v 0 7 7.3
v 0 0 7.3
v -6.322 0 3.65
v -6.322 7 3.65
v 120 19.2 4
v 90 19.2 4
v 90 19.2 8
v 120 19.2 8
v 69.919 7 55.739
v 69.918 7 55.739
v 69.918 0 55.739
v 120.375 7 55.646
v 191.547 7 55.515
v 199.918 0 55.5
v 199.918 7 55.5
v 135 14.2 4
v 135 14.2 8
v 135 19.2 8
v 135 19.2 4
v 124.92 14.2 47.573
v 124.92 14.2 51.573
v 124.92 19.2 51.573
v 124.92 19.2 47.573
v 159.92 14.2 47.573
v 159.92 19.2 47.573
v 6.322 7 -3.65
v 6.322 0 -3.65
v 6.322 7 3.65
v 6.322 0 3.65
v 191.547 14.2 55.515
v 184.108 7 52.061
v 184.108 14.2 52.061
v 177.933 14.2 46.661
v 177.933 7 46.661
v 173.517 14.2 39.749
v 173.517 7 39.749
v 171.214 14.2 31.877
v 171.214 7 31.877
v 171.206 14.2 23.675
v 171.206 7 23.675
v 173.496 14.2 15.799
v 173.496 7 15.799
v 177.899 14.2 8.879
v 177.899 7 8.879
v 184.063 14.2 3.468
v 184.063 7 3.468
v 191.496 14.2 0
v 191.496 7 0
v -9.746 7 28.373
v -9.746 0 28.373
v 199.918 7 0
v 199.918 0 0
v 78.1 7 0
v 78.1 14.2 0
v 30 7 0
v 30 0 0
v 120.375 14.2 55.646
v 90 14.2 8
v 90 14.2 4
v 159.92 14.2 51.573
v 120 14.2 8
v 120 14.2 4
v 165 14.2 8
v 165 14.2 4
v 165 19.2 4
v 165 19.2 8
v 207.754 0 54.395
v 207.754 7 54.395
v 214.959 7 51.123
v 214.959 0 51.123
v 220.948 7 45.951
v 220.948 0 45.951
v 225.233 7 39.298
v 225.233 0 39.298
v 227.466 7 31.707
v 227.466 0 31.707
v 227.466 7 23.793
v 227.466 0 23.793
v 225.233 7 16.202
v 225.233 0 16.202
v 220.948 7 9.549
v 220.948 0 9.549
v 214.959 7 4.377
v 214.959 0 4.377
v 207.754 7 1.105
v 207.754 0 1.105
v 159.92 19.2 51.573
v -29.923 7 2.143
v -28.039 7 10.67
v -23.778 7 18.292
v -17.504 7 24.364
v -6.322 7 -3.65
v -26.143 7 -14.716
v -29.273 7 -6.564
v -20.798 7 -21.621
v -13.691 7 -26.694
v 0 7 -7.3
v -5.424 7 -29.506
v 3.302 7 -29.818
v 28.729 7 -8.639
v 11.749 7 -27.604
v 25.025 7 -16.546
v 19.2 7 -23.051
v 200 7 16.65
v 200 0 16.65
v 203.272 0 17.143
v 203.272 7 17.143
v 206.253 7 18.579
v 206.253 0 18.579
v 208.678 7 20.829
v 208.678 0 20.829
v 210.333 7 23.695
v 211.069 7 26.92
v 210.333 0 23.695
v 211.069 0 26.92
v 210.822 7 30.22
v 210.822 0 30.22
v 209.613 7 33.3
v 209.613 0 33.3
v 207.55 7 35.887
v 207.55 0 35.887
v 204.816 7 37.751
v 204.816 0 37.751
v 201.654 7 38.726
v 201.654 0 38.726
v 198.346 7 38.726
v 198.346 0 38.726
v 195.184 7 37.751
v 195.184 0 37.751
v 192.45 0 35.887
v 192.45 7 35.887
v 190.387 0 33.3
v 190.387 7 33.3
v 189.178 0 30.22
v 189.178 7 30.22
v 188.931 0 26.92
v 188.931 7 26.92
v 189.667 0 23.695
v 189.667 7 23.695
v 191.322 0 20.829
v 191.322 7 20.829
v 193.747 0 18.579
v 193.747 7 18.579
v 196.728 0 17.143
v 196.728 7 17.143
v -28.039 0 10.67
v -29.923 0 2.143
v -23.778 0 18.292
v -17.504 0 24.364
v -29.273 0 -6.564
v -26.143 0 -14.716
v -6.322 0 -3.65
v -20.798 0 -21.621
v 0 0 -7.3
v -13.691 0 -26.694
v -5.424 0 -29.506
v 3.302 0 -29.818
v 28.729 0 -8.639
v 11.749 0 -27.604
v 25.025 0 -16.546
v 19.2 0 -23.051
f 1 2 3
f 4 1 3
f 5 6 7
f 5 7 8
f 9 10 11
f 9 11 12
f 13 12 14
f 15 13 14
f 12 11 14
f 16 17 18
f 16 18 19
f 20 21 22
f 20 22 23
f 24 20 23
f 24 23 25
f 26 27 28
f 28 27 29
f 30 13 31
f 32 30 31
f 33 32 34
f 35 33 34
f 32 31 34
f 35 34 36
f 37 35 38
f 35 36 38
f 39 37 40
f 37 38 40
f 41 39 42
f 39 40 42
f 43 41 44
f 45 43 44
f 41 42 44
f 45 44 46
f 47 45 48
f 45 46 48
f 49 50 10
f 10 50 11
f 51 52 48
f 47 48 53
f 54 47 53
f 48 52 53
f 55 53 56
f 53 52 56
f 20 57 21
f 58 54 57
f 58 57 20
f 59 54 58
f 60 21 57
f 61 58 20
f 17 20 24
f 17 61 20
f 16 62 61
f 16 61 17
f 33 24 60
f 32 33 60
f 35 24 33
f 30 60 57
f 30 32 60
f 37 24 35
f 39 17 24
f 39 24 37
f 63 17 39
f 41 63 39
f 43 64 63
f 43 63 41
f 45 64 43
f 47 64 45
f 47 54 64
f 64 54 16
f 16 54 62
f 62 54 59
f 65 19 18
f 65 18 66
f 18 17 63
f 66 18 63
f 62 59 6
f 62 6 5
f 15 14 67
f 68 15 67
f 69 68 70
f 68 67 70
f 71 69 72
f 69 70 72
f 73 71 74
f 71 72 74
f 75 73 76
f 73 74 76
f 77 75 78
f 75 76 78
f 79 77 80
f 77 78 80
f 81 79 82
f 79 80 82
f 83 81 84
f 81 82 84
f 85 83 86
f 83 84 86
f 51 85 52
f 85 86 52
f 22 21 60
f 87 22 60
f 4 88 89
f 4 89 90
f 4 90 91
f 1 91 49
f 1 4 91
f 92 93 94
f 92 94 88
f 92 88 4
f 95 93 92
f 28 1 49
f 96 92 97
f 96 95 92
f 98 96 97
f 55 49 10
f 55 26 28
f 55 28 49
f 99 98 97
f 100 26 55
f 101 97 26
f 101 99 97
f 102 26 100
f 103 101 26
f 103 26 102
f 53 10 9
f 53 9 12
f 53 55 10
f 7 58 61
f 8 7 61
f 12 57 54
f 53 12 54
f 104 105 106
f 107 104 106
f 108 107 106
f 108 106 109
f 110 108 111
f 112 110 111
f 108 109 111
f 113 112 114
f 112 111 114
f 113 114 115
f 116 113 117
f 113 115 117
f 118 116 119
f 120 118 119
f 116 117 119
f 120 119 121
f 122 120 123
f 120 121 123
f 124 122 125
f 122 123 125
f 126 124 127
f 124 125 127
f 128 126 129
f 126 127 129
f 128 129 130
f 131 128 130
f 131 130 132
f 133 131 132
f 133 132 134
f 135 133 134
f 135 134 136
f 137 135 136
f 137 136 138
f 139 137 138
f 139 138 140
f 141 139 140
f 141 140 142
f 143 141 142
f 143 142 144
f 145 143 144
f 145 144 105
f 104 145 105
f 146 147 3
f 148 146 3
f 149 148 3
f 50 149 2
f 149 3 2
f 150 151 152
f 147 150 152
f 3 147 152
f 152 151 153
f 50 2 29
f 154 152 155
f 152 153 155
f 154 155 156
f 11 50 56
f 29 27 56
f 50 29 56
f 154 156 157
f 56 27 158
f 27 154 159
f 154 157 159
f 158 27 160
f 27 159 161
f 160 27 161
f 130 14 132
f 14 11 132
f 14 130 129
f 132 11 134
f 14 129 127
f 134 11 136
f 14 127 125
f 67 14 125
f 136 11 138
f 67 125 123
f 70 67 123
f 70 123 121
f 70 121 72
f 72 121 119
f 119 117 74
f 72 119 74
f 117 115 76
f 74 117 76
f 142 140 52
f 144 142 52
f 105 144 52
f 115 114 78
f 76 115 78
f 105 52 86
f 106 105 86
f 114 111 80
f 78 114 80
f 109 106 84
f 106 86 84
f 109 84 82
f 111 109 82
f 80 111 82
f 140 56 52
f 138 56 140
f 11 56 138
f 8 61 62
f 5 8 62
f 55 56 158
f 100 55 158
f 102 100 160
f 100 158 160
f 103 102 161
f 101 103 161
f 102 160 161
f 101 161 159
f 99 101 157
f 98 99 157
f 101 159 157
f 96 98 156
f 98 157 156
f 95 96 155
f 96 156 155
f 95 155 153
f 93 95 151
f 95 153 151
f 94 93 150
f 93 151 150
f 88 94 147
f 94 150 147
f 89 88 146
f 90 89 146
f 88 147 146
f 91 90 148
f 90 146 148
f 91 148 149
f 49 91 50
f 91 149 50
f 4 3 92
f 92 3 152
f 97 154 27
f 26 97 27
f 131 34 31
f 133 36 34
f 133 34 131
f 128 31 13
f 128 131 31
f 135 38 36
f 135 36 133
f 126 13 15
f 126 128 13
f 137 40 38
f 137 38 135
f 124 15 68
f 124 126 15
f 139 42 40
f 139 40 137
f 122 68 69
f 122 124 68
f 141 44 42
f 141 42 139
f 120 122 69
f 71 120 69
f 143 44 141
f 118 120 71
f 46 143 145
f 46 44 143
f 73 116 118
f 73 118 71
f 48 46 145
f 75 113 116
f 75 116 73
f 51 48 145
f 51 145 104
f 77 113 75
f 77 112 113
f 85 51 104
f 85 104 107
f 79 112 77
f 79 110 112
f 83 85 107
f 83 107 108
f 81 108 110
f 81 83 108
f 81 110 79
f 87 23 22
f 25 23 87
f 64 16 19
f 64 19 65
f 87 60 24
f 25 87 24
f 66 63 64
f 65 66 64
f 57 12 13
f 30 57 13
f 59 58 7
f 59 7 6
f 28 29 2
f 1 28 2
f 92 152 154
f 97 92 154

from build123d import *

# Parameters (mm, degrees)
EXTRUDE_1_DEPTH     = 7
CUT_EXTRUDE_1_DEPTH = 9
EXTRUDE_5_DEPTH     = 7.2
SKETCH_14_R         = 11.1
CUT_EXTRUDE_2_DEPTH = 235.901017342
SKETCH_15_W         = 30
SKETCH_15_H         = 4
SKETCH_15_W_2       = 35
EXTRUDE_6_DEPTH     = 5
CUT_EXTRUDE_3_DEPTH = 7.2


with BuildPart() as part:
    # Эскиз1 → Бобышка-Вытянуть1 (new body)
    with BuildSketch(Plane(origin=(0, 0, 0), x_dir=(1, 0, 0), z_dir=(0, 1, 0))):
        with BuildLine():
            Line((199.917837119, 0), (30, 0))
            ThreePointArc((30, 0), (-17.429967854, 24.417129656), (-9.746414708, -28.372652332))
            Line((-9.746414708, -28.372652332), (69.918056204, -55.738545445))
            Line((69.918056204, -55.738545445), (199.917837119, -55.499878365))
            ThreePointArc((199.917837119, -55.499878365), (227.75, -27.75), (199.917837119, -0.000121635))
            Line((199.917837119, -0.000121635), (199.917837119, 0))
        make_face()
    extrude(amount=EXTRUDE_1_DEPTH)

    # Эскиз10 → Вырез-Вытянуть1 (cut)
    with BuildSketch(Plane.XZ):
        Polygon((0, 7.3), (-6.321985448, 3.65), (-6.321985448, -3.65), (0, -7.3), (6.321985448, -3.65), (6.321985448, 3.65), align=None)
    extrude(amount=-CUT_EXTRUDE_1_DEPTH, mode=Mode.SUBTRACT)

    # Эскиз11 → Бобышка-Вытянуть5 (add)
    with BuildSketch(Plane(origin=(0, 7, 0), x_dir=(1, 0, 0), z_dir=(0, 1, 0))):
        with BuildLine():
            ThreePointArc((191.546705266, -55.515246957), (170.918554023, -27.776478596), (191.495899106, 0))
            Line((191.495899106, 0), (69.918541879, 0))
            Line((69.918541879, 0), (69.918541879, -55.738544553))
            Line((69.918541879, -55.738544553), (191.546705266, -55.515246957))
        make_face()
    extrude(amount=EXTRUDE_5_DEPTH)

    # Эскиз14 → Вырез-Вытянуть2 (cut, through all)
    with BuildSketch(Plane.XZ):
        with Locations(Location((200, 27.75, 0), (0, 0, 270))):
            Circle(SKETCH_14_R)
    extrude(amount=-CUT_EXTRUDE_2_DEPTH, mode=Mode.SUBTRACT)

    # Эскиз15 → Бобышка-Вытянуть6 (add)
    with BuildSketch(Plane(origin=(0, 14.2, 0), x_dir=(1, 0, 0), z_dir=(0, 1, 0))):
        with Locations((105, -6)):
            Rectangle(SKETCH_15_W, SKETCH_15_H)
        with Locations((150, -6)):
            Rectangle(SKETCH_15_W, SKETCH_15_H)
        with Locations((142.42, -49.573303801)):
            Rectangle(SKETCH_15_W_2, SKETCH_15_H)
    extrude(amount=EXTRUDE_6_DEPTH)

    # Эскиз16 → Вырез-Вытянуть3 (cut)
    with BuildSketch(Plane(origin=(0, 14.2, 0), x_dir=(1, 0, 0), z_dir=(0, 1, 0))):
        Polygon((78.100396808, 0), (69.918541879, 0), (69.918541879, -55.738544553), (120.375042432, -55.645911276), align=None)
    extrude(amount=-CUT_EXTRUDE_3_DEPTH, mode=Mode.SUBTRACT)


solid = part.part
